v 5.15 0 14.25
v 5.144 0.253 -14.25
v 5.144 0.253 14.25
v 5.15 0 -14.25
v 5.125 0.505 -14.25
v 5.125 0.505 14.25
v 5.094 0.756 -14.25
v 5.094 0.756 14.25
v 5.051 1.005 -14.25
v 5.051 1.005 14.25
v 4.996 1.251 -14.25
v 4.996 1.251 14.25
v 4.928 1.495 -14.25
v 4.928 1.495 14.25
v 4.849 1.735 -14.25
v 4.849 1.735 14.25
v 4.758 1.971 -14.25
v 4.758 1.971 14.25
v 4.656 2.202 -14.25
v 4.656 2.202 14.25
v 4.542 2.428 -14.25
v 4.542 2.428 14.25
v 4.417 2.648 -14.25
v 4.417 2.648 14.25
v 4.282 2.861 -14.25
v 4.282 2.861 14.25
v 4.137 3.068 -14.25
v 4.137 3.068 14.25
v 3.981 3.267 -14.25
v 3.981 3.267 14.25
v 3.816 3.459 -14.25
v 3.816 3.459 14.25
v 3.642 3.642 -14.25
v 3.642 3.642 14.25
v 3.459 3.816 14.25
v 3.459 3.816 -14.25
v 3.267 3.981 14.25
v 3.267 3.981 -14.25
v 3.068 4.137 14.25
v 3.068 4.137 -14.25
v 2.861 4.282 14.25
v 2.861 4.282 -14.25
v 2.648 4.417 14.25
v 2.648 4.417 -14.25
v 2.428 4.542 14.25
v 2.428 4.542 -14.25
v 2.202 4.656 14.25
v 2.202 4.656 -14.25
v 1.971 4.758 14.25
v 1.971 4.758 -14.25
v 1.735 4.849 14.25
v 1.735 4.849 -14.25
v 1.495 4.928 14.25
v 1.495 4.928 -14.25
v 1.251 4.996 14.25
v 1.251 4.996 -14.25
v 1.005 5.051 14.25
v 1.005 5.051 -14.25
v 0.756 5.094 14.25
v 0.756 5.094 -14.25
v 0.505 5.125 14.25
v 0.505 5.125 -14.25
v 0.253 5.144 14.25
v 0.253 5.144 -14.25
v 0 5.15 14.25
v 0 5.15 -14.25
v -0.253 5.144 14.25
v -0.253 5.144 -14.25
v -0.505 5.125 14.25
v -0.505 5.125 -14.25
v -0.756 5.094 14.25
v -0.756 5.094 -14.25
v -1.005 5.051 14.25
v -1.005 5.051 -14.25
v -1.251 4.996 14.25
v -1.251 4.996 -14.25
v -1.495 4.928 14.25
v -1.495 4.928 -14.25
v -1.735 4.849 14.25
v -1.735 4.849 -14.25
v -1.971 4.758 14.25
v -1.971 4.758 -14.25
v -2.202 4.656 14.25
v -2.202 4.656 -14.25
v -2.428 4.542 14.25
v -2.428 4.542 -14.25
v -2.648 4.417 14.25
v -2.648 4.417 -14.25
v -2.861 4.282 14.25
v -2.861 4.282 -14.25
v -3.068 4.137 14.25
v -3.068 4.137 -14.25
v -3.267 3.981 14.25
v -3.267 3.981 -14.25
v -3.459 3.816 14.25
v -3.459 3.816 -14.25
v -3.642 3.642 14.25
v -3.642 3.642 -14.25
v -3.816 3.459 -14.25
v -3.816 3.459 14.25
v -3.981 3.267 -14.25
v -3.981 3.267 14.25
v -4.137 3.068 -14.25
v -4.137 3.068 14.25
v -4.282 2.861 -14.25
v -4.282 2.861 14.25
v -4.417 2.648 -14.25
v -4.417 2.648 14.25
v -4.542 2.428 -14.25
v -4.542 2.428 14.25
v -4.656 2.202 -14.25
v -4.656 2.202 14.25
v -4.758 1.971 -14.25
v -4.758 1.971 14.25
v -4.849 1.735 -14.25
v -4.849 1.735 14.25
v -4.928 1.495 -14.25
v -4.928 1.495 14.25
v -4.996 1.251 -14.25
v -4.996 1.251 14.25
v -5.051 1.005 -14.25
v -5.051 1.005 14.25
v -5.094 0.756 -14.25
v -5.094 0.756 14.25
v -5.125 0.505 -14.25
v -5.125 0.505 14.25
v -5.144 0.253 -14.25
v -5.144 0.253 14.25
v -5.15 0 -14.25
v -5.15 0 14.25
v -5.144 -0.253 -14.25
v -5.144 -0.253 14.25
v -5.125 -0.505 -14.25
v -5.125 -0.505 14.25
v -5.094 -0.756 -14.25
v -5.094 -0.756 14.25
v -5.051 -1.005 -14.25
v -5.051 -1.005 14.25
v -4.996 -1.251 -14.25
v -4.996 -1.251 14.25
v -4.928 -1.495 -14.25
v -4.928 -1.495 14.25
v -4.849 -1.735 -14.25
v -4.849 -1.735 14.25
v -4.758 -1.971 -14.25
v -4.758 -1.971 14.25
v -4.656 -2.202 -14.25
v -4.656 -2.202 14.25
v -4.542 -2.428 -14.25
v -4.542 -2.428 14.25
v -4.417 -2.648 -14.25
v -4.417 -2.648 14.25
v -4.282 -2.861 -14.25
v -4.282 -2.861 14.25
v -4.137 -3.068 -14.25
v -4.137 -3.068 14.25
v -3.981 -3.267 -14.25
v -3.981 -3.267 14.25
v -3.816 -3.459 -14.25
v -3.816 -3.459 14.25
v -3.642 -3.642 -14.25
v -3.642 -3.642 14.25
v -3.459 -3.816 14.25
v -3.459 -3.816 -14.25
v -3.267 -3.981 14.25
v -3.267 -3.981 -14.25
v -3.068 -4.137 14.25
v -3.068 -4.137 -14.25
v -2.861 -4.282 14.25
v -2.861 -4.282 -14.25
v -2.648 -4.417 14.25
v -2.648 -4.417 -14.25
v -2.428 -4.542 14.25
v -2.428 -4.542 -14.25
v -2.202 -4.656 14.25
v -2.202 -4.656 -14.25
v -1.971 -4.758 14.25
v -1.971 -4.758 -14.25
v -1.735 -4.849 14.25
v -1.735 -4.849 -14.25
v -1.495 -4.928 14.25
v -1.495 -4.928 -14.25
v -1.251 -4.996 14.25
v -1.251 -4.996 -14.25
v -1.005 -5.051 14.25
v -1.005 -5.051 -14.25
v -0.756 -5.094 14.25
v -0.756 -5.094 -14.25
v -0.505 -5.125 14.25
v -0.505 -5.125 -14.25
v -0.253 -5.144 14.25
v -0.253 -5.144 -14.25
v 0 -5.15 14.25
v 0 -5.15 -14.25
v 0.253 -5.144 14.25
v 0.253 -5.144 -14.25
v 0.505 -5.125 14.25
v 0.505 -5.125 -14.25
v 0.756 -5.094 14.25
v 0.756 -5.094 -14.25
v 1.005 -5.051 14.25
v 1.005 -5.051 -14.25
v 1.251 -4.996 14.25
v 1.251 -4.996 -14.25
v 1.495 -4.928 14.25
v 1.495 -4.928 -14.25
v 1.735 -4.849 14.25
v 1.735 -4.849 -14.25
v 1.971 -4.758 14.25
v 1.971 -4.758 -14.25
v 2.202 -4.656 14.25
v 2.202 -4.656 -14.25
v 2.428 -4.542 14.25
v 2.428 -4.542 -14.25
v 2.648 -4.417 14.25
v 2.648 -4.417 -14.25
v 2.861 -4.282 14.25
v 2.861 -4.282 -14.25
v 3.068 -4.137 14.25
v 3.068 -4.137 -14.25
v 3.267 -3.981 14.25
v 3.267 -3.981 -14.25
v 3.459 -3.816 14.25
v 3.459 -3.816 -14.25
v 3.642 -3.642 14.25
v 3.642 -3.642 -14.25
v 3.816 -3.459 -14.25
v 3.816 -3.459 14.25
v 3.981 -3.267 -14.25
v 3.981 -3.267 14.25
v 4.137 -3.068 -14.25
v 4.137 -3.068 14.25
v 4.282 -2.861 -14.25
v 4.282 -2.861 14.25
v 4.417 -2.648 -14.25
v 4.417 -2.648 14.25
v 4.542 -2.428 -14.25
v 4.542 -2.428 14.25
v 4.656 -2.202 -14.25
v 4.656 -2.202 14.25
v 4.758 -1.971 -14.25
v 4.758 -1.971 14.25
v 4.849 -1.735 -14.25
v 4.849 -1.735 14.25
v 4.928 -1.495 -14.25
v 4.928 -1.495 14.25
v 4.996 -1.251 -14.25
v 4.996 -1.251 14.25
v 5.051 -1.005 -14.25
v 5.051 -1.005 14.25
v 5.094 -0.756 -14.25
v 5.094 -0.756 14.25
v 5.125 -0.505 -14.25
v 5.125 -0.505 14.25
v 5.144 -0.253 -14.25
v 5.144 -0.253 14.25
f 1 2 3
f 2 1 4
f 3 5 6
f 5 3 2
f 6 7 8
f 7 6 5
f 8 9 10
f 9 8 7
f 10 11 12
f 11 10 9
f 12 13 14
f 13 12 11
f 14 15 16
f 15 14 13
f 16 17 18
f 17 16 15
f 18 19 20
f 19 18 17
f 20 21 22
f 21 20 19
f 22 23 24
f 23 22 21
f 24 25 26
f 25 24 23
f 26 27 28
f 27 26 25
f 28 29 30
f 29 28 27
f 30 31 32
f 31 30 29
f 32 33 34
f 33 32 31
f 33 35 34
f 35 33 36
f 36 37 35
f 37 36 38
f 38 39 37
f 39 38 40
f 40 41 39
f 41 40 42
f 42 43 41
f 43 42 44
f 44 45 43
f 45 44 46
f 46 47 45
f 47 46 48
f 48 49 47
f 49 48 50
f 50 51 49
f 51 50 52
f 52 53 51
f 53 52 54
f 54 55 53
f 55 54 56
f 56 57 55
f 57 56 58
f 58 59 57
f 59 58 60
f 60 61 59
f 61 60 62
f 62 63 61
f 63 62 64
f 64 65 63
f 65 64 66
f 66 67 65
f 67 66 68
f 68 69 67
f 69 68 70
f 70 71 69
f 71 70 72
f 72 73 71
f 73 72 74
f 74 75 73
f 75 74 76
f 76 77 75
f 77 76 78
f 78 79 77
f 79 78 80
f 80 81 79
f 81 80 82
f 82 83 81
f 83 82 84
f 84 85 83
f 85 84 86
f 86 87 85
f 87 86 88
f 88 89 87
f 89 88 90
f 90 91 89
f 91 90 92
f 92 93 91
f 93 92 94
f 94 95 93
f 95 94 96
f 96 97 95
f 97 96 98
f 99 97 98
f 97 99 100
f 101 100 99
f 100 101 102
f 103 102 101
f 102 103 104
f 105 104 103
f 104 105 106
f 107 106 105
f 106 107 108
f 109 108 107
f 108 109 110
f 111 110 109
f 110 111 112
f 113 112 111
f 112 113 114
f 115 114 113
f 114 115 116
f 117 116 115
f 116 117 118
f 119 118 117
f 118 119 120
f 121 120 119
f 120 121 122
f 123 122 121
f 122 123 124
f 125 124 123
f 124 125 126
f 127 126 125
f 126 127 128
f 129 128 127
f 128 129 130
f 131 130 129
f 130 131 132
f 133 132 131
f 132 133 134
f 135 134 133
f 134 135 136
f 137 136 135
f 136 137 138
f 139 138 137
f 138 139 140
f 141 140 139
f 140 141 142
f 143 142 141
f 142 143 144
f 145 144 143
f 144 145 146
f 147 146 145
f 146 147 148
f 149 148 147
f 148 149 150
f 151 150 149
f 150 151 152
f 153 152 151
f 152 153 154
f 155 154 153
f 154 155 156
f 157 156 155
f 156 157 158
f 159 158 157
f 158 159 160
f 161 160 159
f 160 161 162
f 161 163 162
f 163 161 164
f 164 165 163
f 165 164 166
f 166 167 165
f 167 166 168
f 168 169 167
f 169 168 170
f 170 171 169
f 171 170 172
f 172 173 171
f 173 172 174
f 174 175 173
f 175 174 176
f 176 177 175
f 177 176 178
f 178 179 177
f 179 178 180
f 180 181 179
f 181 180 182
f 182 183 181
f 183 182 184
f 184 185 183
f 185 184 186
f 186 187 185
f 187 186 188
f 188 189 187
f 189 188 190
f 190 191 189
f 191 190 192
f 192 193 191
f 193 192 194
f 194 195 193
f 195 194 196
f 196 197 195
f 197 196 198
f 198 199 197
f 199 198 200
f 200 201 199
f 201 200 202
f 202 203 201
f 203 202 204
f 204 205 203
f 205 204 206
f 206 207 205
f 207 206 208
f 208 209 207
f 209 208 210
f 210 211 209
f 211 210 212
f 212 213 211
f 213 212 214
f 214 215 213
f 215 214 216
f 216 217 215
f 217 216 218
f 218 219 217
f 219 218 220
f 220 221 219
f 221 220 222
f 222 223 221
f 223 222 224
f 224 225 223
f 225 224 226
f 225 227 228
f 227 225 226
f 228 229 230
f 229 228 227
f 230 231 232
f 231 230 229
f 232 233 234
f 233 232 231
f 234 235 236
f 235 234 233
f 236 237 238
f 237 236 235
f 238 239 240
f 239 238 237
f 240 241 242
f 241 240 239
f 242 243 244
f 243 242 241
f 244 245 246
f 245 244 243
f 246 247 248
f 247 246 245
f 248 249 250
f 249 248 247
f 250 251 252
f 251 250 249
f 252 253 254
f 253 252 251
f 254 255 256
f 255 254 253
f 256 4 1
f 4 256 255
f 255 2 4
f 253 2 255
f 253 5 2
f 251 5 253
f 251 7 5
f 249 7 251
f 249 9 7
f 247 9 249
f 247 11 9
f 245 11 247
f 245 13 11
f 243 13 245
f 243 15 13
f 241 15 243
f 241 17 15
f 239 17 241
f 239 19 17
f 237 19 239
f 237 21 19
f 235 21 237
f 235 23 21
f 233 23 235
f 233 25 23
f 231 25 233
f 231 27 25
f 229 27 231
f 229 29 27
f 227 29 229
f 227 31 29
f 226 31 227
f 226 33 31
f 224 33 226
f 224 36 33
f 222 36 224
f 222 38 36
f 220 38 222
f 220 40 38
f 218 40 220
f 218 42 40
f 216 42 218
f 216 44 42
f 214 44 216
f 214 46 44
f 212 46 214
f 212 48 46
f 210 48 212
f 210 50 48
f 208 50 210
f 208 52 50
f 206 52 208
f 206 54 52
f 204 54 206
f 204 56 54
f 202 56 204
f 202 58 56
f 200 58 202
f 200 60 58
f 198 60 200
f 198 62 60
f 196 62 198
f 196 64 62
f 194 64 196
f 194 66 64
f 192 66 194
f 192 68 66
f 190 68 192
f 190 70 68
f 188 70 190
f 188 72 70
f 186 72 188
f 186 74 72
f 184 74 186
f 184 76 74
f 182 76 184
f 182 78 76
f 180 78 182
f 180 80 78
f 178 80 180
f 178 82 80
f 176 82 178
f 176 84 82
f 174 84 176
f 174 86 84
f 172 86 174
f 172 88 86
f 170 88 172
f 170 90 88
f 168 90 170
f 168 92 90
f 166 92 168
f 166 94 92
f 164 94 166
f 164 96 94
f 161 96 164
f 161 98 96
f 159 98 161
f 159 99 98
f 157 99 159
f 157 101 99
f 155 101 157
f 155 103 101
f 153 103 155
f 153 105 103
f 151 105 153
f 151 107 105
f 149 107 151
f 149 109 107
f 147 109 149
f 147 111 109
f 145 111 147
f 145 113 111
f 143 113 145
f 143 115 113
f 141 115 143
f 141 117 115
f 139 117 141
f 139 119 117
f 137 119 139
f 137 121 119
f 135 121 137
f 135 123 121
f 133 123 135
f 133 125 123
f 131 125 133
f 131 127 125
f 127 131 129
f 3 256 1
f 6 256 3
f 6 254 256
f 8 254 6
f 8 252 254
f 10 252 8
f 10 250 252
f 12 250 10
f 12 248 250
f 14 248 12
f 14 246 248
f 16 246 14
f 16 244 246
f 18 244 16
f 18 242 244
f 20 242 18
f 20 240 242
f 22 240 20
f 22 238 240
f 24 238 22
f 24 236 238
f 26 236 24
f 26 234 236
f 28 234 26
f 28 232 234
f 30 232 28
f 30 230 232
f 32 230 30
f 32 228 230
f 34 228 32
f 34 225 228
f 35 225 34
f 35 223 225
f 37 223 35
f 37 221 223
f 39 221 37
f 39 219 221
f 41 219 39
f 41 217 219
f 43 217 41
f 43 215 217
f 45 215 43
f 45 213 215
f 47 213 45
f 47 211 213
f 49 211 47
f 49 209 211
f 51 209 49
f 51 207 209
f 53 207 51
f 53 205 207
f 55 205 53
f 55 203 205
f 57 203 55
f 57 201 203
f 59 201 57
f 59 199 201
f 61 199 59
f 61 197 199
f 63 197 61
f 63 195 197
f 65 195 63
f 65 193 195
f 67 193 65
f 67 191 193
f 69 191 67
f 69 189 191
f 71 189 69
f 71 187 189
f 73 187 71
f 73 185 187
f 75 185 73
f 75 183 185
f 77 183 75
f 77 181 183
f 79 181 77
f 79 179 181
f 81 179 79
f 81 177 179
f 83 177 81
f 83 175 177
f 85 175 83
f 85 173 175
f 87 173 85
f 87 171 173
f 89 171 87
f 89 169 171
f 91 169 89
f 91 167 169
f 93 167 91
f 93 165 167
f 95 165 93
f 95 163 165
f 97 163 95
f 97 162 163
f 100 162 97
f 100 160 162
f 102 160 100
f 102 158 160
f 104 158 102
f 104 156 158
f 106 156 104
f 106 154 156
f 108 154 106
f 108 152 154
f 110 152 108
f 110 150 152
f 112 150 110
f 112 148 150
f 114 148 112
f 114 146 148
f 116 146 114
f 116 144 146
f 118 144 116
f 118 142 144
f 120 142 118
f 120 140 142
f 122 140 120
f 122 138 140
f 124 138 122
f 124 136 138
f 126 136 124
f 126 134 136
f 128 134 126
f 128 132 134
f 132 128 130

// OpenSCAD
$fn = 128;

// Battery cell target dimensions (overall envelope)
cell_height   = 28.5;   // mm (overall height)
cell_diameter = 10.3;   // mm (overall diameter)

// Small overlap to guarantee manifold unions/differences
overlap = 0.2; // mm

r_cell = cell_diameter/2;

// Simple, single-solid cell: no holes/indents/buttons/bands.
// This ensures orthographic views are consistent and dimensions are unambiguous.
module battery_cell() {
    cylinder(h=cell_height, r=r_cell, center=true);
}

battery_cell();
